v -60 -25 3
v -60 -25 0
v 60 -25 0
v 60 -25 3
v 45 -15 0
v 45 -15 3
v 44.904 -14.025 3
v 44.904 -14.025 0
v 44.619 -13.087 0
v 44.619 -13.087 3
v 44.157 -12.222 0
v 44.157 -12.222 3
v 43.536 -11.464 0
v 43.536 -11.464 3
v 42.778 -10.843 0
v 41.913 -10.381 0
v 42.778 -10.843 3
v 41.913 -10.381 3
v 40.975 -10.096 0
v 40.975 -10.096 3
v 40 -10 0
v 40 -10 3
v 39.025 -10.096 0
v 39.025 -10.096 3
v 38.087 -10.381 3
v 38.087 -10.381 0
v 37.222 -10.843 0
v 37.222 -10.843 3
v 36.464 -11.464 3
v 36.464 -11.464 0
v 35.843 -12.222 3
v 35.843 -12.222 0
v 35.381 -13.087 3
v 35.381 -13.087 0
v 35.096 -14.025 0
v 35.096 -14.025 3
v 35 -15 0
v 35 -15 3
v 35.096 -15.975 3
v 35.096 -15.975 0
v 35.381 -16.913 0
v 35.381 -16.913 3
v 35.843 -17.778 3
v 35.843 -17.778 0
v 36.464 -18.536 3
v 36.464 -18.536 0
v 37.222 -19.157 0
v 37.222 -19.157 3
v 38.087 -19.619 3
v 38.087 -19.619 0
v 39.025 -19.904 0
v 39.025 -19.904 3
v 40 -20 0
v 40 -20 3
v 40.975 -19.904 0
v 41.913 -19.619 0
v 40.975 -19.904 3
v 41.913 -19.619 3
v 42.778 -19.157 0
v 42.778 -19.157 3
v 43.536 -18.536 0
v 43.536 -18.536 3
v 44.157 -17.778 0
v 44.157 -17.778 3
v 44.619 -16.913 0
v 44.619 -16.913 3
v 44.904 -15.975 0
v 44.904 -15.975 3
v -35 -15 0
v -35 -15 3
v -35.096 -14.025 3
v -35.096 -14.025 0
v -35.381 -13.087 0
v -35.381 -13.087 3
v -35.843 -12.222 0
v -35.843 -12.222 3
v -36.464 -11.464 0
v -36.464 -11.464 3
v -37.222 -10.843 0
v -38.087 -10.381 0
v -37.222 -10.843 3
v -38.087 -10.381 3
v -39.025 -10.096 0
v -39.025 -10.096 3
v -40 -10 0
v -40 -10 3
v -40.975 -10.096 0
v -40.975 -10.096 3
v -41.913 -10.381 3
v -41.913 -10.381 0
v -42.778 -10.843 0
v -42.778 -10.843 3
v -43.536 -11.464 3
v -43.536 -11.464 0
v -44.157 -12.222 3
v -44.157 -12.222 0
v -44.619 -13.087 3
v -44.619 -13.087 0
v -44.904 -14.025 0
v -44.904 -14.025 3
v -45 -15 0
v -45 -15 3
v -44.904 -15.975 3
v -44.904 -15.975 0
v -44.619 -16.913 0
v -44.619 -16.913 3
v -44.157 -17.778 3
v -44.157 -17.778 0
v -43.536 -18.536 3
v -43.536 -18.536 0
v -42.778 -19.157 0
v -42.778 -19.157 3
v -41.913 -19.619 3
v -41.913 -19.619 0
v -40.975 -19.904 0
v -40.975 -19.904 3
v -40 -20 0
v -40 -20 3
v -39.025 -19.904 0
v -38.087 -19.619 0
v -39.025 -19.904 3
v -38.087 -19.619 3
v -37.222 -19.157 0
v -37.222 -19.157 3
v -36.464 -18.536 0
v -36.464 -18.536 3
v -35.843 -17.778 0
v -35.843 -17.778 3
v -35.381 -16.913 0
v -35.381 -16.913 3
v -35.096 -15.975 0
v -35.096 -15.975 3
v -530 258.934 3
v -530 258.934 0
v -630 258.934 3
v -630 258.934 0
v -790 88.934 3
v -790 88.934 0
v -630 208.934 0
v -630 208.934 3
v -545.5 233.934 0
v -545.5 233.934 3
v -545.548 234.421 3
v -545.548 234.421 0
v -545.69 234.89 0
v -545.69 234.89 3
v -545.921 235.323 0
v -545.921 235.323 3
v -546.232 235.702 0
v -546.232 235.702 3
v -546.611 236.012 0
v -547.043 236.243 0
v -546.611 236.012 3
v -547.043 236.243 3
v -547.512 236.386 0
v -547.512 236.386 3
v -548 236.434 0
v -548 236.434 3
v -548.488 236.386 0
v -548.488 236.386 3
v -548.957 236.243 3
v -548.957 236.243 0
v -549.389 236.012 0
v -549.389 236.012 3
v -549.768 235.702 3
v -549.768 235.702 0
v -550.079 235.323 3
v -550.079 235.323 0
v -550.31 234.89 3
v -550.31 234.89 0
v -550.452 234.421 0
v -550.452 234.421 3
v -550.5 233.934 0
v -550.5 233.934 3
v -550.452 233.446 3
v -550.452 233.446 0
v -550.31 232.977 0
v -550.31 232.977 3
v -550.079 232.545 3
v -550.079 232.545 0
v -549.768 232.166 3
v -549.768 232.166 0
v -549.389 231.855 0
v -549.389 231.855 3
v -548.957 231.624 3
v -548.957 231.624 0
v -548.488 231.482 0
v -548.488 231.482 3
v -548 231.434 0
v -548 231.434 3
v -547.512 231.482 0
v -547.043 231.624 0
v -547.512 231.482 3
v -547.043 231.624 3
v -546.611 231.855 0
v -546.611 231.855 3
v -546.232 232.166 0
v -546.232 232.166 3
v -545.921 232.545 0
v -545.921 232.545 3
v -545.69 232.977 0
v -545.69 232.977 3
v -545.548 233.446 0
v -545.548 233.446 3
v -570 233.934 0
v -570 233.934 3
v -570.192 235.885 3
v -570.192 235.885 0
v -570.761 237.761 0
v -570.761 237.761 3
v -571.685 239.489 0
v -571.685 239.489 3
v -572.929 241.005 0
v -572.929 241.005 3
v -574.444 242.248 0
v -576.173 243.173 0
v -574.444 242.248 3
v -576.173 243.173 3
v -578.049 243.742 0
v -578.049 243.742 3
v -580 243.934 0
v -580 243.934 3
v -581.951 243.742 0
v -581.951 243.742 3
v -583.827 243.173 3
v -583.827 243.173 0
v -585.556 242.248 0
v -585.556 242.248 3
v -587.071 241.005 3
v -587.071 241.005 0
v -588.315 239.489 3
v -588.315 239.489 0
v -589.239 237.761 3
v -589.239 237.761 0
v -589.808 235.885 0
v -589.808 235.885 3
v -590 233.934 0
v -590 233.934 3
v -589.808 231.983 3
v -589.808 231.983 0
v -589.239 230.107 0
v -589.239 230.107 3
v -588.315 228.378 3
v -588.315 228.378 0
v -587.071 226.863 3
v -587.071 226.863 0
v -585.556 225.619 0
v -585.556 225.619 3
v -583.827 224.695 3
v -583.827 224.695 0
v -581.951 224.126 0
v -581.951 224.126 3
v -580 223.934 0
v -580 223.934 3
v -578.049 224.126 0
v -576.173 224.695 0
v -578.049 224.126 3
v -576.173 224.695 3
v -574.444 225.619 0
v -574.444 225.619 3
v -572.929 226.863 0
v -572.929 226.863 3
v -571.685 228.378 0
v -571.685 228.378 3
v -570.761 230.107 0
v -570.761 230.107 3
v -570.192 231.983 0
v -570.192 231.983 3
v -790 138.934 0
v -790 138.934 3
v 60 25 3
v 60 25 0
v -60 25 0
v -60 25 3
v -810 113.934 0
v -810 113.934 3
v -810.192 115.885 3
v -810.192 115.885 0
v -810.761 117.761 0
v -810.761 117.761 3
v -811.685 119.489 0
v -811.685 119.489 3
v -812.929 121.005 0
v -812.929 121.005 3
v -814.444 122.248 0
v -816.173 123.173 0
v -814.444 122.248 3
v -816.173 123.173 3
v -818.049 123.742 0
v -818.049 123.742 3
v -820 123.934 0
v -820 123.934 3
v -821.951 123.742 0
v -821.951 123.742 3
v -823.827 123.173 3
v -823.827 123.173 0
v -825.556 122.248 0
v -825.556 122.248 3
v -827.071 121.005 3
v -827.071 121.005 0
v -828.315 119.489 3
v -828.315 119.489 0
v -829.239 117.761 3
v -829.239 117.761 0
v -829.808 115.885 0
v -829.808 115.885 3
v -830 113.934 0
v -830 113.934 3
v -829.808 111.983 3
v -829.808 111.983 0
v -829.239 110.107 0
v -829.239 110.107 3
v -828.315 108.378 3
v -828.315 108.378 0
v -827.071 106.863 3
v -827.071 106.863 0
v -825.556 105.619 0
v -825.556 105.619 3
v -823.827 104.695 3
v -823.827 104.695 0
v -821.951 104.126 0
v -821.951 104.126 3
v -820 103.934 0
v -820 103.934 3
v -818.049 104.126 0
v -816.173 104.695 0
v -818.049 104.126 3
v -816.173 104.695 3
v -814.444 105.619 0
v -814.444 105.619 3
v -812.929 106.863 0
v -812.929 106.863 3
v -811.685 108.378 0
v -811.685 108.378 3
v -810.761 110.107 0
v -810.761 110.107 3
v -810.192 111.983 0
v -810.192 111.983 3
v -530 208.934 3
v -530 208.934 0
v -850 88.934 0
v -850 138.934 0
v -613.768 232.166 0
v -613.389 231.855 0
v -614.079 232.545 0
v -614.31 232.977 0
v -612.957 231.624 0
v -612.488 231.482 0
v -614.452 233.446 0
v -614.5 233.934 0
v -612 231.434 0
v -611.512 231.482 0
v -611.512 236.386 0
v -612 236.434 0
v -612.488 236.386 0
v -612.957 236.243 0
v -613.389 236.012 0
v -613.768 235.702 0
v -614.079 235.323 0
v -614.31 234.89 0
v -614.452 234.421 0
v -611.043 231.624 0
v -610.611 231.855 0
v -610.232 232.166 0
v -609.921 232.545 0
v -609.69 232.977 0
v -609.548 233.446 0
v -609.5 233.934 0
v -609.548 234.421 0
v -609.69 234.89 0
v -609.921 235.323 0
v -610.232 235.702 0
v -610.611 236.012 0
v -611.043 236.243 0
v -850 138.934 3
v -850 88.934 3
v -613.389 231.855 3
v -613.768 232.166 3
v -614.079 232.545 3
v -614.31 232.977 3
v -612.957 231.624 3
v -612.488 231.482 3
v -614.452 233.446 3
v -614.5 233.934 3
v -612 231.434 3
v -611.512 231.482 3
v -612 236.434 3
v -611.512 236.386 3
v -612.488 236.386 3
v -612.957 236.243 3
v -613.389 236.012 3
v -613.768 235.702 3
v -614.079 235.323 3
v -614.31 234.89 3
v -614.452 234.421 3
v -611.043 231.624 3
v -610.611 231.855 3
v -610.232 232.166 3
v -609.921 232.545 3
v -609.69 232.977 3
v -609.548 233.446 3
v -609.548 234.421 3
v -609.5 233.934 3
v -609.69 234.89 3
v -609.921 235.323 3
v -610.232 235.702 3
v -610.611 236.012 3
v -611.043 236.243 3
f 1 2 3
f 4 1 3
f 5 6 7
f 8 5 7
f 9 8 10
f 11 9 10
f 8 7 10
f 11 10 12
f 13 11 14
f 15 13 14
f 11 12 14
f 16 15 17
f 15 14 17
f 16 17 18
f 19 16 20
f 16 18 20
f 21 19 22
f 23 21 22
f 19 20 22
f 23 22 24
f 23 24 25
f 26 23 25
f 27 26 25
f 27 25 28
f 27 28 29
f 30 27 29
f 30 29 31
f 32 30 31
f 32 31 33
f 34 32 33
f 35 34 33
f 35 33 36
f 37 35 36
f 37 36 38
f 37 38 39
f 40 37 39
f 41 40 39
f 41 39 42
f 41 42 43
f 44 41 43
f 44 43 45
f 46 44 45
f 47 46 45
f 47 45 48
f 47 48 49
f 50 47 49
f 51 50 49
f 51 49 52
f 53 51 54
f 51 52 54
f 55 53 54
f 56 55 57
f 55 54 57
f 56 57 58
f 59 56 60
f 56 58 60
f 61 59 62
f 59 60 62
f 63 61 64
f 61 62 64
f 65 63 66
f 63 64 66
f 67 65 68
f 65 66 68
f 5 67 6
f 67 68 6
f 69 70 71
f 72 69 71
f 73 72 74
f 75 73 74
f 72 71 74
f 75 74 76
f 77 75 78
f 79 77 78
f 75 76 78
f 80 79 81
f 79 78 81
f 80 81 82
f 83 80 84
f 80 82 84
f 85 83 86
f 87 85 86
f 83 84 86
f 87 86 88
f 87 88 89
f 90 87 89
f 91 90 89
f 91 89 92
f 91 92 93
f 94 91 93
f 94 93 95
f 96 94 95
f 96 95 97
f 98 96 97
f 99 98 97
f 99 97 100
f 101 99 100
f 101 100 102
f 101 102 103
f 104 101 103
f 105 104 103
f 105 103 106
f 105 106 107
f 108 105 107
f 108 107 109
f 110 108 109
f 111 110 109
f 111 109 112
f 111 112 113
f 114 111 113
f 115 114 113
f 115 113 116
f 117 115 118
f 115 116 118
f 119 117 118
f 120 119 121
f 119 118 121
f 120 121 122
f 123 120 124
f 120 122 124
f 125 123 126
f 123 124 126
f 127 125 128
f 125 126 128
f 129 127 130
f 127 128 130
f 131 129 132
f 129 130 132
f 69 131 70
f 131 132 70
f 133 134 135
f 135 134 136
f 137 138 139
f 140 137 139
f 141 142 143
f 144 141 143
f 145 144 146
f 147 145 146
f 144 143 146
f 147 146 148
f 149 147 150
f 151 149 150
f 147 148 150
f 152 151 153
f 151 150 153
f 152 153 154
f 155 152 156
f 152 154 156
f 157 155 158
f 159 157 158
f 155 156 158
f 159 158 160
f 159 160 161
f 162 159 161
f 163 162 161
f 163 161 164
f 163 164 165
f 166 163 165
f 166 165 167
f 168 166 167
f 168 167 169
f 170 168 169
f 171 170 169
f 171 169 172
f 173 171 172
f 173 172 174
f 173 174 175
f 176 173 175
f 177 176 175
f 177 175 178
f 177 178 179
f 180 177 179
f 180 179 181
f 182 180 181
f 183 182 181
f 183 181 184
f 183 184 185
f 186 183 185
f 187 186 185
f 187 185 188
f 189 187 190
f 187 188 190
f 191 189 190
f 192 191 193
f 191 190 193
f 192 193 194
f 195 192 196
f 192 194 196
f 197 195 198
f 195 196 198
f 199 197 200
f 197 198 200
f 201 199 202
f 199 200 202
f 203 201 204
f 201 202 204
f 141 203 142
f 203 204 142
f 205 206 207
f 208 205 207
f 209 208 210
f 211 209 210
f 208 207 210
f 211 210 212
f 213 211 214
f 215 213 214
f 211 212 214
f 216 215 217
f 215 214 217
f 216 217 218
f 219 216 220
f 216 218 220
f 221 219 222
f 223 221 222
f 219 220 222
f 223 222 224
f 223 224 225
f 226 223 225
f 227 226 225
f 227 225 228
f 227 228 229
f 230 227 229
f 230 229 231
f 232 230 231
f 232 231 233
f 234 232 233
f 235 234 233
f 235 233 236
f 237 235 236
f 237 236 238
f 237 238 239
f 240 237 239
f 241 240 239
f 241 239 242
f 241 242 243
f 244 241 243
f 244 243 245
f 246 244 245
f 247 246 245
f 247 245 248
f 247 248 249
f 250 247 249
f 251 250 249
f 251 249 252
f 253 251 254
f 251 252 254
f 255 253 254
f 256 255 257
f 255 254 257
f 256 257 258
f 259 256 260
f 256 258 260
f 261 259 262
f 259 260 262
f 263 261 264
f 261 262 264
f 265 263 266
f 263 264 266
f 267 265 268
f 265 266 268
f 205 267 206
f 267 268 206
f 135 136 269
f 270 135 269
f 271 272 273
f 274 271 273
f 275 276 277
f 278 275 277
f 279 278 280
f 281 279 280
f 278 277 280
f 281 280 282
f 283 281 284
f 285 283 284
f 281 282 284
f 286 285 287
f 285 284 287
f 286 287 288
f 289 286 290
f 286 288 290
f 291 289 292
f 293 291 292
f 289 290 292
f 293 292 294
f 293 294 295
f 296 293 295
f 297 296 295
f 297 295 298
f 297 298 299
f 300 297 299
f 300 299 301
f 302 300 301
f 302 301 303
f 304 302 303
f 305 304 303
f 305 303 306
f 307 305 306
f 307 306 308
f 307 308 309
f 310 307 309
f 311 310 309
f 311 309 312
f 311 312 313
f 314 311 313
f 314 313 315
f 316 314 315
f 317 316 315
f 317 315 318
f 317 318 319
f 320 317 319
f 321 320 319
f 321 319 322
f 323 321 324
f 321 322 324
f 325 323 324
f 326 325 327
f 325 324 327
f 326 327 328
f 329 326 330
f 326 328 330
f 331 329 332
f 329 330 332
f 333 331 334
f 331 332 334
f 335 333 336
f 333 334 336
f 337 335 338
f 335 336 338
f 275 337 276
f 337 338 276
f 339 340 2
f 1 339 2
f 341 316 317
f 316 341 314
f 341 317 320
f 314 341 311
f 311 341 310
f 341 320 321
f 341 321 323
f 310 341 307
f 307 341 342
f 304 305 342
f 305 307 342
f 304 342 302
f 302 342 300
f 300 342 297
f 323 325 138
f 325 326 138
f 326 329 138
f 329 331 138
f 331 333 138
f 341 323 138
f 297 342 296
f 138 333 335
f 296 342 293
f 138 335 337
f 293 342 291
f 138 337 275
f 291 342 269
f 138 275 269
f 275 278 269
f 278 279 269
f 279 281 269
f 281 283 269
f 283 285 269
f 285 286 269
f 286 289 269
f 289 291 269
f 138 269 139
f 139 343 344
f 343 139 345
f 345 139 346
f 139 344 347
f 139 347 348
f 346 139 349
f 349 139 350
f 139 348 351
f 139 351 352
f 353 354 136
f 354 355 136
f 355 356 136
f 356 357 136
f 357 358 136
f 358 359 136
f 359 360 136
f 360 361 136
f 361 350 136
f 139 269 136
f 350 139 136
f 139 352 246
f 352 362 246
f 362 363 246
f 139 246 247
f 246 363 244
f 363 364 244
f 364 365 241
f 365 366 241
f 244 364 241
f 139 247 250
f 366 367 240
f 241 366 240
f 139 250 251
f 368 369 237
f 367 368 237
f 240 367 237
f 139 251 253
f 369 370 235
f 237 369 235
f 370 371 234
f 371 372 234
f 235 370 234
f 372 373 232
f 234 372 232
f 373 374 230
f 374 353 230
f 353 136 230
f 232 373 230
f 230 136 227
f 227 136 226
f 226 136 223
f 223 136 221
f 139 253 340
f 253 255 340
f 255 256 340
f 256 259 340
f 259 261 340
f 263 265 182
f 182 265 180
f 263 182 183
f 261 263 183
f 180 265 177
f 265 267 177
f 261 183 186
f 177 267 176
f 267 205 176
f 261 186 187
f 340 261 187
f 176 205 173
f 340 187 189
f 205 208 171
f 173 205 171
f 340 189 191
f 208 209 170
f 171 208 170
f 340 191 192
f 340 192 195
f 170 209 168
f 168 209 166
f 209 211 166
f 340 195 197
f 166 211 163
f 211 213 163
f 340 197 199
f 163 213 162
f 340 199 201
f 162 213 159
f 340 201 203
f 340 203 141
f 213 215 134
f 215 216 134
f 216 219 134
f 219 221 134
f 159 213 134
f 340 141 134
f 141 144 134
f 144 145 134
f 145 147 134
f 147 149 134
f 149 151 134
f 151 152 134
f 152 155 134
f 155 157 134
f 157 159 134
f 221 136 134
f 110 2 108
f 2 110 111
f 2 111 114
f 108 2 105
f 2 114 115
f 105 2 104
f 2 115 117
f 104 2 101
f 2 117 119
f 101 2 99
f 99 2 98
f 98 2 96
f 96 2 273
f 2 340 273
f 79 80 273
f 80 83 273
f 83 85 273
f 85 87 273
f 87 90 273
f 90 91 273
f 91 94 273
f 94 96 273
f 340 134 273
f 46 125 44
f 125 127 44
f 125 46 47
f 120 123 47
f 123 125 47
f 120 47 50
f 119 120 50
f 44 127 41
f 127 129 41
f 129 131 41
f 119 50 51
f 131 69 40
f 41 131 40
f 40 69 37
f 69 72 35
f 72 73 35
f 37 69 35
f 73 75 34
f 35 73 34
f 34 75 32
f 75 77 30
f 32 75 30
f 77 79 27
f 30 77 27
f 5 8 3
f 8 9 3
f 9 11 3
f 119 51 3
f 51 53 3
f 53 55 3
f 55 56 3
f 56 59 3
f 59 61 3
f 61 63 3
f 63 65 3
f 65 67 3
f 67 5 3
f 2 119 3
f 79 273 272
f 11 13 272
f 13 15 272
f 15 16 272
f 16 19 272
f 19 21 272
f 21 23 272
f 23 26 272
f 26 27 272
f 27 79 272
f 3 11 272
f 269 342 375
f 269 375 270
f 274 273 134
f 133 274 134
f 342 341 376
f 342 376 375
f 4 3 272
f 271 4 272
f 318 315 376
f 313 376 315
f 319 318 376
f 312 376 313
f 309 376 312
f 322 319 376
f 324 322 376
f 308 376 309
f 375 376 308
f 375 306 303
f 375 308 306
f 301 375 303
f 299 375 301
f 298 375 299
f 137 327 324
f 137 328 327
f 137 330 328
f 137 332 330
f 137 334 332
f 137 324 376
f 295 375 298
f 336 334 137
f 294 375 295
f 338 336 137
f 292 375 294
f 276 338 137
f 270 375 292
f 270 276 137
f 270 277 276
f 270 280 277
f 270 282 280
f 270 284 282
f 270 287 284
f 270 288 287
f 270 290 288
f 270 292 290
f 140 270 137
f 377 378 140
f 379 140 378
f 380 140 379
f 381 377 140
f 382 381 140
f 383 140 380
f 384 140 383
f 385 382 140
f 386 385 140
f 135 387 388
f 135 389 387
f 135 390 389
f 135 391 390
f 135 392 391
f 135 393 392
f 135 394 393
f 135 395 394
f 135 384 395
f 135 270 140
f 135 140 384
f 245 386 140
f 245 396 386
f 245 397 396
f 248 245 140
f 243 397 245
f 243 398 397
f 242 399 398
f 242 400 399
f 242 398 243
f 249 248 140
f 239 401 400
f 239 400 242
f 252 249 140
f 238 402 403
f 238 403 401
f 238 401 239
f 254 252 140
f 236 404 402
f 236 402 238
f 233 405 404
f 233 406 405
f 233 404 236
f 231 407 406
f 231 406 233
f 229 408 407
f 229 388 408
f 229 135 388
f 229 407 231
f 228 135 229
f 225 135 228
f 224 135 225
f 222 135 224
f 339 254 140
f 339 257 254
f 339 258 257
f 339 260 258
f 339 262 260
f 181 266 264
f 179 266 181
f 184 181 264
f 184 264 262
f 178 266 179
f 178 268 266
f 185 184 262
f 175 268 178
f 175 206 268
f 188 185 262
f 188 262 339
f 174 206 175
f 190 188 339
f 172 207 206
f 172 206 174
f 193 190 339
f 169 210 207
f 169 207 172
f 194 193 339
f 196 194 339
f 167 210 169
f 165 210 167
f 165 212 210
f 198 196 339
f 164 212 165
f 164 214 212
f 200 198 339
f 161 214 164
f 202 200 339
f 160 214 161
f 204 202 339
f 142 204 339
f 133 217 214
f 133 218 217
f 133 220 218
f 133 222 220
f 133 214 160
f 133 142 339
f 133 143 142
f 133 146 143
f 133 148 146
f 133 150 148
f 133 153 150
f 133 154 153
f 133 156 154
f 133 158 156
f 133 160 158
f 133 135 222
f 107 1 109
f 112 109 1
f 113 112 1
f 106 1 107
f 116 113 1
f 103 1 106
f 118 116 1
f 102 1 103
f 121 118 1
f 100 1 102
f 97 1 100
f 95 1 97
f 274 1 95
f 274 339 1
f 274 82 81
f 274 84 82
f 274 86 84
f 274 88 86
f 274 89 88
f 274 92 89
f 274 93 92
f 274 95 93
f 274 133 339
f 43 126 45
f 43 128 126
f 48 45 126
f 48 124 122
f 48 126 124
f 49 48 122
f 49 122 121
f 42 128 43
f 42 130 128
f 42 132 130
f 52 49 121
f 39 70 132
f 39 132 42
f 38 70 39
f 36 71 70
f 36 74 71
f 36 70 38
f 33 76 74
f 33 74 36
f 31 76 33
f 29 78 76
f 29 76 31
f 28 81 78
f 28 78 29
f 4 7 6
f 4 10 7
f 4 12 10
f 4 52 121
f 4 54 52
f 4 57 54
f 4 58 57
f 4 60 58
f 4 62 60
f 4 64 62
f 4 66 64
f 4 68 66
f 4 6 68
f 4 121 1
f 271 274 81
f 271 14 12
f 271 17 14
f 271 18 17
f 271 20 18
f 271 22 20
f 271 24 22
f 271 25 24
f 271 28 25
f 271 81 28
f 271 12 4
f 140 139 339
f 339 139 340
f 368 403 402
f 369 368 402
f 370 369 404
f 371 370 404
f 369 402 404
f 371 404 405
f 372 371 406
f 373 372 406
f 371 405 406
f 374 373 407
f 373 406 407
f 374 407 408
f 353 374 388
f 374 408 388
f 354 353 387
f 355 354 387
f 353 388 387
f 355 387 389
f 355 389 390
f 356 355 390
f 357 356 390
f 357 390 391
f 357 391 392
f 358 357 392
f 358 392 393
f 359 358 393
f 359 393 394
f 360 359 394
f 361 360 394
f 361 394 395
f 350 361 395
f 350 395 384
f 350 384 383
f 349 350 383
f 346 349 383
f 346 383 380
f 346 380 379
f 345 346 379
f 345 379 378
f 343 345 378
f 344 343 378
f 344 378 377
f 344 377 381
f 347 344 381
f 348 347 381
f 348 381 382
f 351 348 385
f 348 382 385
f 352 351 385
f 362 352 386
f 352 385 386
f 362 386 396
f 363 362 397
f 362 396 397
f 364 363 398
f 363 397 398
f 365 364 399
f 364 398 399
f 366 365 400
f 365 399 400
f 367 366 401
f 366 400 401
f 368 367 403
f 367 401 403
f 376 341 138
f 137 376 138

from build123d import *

# Parameters (mm, degrees)
BOSS_EXTRUDE3_DEPTH = 3
SKETCH3_R           = 10
SKETCH3_R_2         = 5
CUT_EXTRUDE1_DEPTH  = 889.569461306
SKETCH4_R           = 2.5
CUT_EXTRUDE2_DEPTH  = 10


with BuildPart() as part:
    # Sketch1 → Boss-Extrude3 (new body)
    with BuildSketch(Plane.XY):
        Polygon((60, 25), (-60, 25), (-530, 258.933751306), (-630, 258.933751306), (-790, 138.933751306), (-850, 138.933751306), (-850, 88.933751306), (-790, 88.933751306), (-630, 208.933751306), (-530, 208.933751306), (-60, -25), (60, -25), align=None)
    extrude(amount=BOSS_EXTRUDE3_DEPTH)

    # Sketch3 → Cut-Extrude1 (cut, through all)
    with BuildSketch(Plane.XY.offset(3)):
        with Locations((-580, 233.933751306)):
            Circle(SKETCH3_R)
        with Locations((-820, 113.933751306)):
            Circle(SKETCH3_R)
        with Locations((40, -15)):
            Circle(SKETCH3_R_2)
        with Locations((-40, -15)):
            Circle(SKETCH3_R_2)
    extrude(amount=-CUT_EXTRUDE1_DEPTH, mode=Mode.SUBTRACT)

    # Sketch4 → Cut-Extrude2 (cut)
    with BuildSketch(Plane.XY.offset(3)):
        with Locations((-548, 233.933751306)):
            Circle(SKETCH4_R)
        with Locations((-612, 233.933751306)):
            Circle(SKETCH4_R)
    extrude(amount=-CUT_EXTRUDE2_DEPTH, mode=Mode.SUBTRACT)


solid = part.part
